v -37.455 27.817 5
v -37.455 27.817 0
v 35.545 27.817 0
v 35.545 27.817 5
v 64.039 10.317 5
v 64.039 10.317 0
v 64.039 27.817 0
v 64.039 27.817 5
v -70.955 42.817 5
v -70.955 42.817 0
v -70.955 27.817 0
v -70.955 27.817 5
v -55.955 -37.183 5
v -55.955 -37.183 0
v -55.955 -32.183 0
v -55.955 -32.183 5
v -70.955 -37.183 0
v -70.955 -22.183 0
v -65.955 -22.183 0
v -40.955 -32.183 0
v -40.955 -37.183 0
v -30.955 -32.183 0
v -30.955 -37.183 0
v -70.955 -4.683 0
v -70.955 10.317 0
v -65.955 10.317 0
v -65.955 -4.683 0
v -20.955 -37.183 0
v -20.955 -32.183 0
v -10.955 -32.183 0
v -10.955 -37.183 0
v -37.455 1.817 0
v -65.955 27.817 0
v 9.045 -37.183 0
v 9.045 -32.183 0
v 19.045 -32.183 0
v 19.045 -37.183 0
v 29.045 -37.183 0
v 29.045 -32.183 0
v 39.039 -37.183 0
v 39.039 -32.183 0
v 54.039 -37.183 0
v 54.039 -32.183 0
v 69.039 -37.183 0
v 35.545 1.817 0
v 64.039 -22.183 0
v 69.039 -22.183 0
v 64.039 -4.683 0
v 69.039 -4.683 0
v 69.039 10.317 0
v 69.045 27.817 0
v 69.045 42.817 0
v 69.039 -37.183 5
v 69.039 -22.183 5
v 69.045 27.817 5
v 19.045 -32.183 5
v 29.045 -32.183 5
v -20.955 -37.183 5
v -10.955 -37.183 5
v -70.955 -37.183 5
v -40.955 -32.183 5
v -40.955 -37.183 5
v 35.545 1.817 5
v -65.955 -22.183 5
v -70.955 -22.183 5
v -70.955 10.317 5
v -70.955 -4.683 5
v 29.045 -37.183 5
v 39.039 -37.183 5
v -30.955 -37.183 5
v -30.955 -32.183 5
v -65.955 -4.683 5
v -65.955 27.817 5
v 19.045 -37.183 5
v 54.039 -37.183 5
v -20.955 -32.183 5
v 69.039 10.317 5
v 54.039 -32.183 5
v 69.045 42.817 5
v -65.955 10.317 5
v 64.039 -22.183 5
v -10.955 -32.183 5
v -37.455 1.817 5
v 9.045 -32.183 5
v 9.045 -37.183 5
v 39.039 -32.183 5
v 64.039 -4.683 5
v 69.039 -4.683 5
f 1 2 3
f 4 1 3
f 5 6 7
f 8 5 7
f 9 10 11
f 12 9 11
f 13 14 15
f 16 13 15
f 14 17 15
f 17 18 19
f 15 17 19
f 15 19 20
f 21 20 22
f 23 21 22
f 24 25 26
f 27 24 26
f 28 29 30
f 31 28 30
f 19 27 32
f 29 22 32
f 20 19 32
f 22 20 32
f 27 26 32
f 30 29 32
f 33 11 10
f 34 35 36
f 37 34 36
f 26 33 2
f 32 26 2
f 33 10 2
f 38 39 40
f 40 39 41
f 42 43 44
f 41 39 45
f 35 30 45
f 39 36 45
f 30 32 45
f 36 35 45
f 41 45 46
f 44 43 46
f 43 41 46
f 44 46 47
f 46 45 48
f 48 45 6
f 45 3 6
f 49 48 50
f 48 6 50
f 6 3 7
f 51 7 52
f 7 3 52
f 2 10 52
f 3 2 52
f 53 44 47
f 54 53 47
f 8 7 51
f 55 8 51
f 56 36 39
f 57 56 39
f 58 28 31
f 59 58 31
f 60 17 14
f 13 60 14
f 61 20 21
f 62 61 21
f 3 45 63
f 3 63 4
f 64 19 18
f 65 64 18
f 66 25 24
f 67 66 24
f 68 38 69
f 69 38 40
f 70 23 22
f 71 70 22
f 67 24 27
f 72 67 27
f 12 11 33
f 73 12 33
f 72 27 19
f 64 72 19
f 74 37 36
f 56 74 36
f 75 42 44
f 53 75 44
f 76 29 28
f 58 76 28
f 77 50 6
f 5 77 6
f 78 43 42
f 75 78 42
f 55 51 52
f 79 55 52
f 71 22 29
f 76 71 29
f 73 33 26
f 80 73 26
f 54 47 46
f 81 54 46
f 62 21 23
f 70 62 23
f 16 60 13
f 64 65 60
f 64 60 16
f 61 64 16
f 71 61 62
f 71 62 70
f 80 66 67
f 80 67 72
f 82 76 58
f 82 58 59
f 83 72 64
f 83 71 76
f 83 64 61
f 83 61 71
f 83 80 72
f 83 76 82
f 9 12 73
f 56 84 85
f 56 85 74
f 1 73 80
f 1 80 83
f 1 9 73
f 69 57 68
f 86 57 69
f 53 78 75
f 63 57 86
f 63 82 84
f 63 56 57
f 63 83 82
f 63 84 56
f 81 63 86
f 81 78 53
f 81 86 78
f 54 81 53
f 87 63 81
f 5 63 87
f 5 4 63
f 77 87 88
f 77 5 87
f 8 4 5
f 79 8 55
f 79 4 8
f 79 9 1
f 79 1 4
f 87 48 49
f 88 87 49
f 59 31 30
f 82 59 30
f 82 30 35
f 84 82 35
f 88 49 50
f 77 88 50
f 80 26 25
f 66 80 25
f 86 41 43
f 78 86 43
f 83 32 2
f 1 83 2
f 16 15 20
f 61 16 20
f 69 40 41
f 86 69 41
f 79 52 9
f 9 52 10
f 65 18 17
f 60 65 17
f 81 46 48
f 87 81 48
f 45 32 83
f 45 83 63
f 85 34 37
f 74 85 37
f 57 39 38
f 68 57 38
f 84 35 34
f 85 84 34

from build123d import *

# Parameters (mm, degrees)
SKETCH1_W           = 73
SKETCH1_H           = 26
BOSS_EXTRUDE1_DEPTH = 5


with BuildPart() as part:
    # Sketch1 → Boss-Extrude1 (new body)
    with BuildSketch(Plane.XY):
        Polygon((64.038630962, -4.683293815), (69.038630962, -4.683293815), (69.038630962, 10.316706185), (64.038630962, 10.316706185), (64.038630962, 27.816706185), (69.044687612, 27.816706185), (69.044687612, 42.816706185), (-70.955312388, 42.816706185), (-70.955312388, 27.816706185), (-65.955312388, 27.816706185), (-65.955312388, 10.316706185), (-70.955312388, 10.316706185), (-70.955312388, -4.683293815), (-65.955312388, -4.683293815), (-65.955312388, -22.183293815), (-70.955312388, -22.183293815), (-70.955312388, -37.183293815), (-55.955312388, -37.183293815), (-55.955312388, -32.183293815), (-40.955312388, -32.183293815), (-40.955312388, -37.183293815), (-30.955312388, -37.183293815), (-30.955312388, -32.183293815), (-20.955312388, -32.183293815), (-20.955312388, -37.183293815), (-10.955312388, -37.183293815), (-10.955312388, -32.183293815), (-0.955312388, -32.183293815), (9.044687612, -32.183293815), (9.044687612, -37.183293815), (19.044687612, -37.183293815), (19.044687612, -32.183293815), (29.044687612, -32.183293815), (29.044687612, -37.183293815), (39.038630962, -37.183293815), (39.038630962, -32.183293815), (39.044687612, -32.183293815), (54.038630962, -32.183293815), (54.038630962, -37.183293815), (69.038630962, -37.183293815), (69.038630962, -22.183293815), (64.038630962, -22.183293815), align=None)
        with Locations((-0.955312388, 14.816706185)):
            Rectangle(SKETCH1_W, SKETCH1_H, mode=Mode.SUBTRACT)
    extrude(amount=BOSS_EXTRUDE1_DEPTH)


solid = part.part
